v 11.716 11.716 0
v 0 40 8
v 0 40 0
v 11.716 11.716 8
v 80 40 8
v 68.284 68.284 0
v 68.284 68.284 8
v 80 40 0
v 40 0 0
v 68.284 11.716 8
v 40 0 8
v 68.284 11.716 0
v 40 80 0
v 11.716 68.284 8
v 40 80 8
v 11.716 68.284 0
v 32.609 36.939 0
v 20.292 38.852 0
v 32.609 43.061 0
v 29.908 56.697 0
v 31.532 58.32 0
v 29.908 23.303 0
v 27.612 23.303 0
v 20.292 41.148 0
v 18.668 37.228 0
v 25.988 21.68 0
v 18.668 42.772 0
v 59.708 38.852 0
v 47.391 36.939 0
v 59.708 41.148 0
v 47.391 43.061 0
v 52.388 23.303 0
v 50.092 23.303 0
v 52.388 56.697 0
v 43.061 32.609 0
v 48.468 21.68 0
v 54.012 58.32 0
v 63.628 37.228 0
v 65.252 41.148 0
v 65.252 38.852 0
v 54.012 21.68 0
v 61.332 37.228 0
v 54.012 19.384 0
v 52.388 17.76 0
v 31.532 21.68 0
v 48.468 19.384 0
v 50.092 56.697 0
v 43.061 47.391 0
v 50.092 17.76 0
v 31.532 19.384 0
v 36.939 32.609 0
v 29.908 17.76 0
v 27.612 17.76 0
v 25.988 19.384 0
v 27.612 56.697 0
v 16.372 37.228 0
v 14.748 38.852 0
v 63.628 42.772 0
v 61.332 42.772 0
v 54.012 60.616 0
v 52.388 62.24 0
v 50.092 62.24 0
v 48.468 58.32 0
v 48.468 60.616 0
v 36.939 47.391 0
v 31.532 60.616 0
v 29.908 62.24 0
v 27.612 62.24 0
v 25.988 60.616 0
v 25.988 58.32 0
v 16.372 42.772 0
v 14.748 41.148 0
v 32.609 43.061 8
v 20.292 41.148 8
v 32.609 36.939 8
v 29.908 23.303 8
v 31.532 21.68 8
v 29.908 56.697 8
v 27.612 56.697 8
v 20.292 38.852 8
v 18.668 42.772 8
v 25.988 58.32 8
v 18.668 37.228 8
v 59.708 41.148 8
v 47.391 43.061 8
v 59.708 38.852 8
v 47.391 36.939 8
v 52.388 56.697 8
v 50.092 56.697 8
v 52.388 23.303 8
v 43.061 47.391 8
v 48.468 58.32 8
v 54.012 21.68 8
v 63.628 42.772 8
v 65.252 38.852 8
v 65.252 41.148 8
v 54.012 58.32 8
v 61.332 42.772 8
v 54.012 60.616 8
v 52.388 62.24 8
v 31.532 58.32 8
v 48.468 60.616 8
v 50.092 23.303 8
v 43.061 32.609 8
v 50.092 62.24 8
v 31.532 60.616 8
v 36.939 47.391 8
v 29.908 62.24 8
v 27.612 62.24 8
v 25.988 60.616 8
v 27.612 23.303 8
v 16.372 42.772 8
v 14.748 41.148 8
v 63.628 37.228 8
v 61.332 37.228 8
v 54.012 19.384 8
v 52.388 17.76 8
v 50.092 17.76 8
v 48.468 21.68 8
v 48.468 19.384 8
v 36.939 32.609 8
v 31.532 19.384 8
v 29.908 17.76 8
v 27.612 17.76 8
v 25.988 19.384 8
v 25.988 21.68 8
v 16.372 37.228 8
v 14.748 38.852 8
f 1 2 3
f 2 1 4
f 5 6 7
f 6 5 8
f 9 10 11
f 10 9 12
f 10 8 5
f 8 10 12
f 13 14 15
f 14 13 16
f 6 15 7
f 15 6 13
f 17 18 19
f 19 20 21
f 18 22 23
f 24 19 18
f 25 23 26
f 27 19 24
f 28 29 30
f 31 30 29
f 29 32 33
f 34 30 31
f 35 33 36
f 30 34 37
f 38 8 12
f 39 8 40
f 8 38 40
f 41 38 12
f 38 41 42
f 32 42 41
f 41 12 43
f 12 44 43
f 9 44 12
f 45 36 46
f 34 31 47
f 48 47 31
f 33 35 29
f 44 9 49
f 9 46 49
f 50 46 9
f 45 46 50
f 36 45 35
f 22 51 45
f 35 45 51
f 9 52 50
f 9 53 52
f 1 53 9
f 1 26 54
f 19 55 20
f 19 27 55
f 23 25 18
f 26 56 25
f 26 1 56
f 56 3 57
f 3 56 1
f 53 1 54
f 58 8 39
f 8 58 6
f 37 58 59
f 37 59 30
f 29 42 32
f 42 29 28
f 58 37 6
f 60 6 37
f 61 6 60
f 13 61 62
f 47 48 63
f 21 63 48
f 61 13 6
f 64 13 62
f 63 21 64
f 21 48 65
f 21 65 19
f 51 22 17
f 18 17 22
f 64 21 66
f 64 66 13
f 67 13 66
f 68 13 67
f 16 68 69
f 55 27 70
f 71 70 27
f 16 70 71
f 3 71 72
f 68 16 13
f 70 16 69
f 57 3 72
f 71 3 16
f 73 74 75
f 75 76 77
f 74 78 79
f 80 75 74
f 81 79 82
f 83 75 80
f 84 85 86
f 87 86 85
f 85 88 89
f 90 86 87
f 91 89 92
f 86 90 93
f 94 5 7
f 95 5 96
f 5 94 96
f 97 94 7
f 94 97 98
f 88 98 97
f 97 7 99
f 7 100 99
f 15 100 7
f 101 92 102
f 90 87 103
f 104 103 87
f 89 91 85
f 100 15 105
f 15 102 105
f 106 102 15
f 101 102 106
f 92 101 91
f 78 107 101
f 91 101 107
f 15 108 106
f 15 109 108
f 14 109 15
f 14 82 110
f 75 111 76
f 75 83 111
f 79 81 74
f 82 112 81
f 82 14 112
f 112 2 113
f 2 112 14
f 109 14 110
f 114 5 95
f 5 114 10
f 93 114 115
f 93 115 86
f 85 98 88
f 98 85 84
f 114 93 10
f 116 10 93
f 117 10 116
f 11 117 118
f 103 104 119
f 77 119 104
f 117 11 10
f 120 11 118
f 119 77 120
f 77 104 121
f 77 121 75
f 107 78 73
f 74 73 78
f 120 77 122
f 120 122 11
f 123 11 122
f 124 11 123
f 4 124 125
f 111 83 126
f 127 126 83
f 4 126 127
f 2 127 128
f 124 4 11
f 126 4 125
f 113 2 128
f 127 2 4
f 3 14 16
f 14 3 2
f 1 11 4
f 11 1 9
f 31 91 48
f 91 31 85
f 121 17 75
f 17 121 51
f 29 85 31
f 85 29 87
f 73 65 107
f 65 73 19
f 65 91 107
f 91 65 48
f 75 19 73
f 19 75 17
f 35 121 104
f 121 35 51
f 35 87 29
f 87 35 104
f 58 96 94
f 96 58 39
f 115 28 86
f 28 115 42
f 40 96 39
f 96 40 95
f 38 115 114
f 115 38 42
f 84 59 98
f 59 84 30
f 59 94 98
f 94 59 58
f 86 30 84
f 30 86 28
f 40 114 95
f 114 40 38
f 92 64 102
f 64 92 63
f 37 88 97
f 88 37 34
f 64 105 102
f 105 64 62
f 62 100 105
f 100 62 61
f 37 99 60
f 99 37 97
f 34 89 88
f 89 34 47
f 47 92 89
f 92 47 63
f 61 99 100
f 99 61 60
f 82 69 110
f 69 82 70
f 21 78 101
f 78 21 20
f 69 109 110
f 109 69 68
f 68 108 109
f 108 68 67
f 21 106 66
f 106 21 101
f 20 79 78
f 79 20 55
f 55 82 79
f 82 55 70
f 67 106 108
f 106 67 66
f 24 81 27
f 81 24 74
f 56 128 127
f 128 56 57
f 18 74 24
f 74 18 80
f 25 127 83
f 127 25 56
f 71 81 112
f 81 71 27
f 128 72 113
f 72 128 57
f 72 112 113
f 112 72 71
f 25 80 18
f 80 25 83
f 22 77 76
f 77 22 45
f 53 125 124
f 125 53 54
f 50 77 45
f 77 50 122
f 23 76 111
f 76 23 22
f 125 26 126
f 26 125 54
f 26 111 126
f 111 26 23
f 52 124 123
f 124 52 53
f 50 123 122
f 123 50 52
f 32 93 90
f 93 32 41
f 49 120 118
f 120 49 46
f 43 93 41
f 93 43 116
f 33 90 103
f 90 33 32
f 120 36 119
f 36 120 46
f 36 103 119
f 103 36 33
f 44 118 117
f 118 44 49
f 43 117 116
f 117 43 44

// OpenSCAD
$fn = 32;

// ----------------------------------------------------------------------
// Polygon plate: 8-gon R40, 6 bolt windows
// ----------------------------------------------------------------------

// --- parameters (mm) ---
sides = 8;                // number of polygon sides
plate_r = 40;             // circumscribed radius of the polygon
bore_r = 8;               // centre bore radius
bolts = 6;                // number of bolt windows
ring_r = 22.48;           // bolt-circle radius
bolt_r = 3;               // bolt window radius
plate_t = 8;              // plate thickness, Z (extrusion height)
fit_tol = 0.02;           // declared fit tolerance (prompt contract)
free_tol = 0.2;           // declared free tolerance (prompt contract)

plate_d = 2 * plate_r;  // circumscribed diameter
bore_d = 2 * bore_r;  // centre bore diameter
bolt_d = 2 * bolt_r;  // bolt window diameter
ring_d = 2 * ring_r;  // bolt-circle diameter

profile = [[80, 40], [68.284, 68.284], [40, 80], [11.716, 68.284], [0, 40], [11.716, 11.716], [40, 0], [68.284, 11.716]];  // primary outline, 8 points, counter clockwise
void_1 = [[47.391, 43.061], [43.061, 47.391], [36.939, 47.391], [32.609, 43.061], [32.609, 36.939], [36.939, 32.609], [43.061, 32.609], [47.391, 36.939]];  // centre bore, 8 points
void_2 = [[65.252, 41.148], [63.628, 42.772], [61.332, 42.772], [59.708, 41.148], [59.708, 38.852], [61.332, 37.228], [63.628, 37.228], [65.252, 38.852]];  // bolt window 1, 8 points
void_3 = [[54.012, 60.616], [52.388, 62.24], [50.092, 62.24], [48.468, 60.616], [48.468, 58.32], [50.092, 56.697], [52.388, 56.697], [54.012, 58.32]];  // bolt window 2, 8 points
void_4 = [[31.532, 60.616], [29.908, 62.24], [27.612, 62.24], [25.988, 60.616], [25.988, 58.32], [27.612, 56.697], [29.908, 56.697], [31.532, 58.32]];  // bolt window 3, 8 points
void_5 = [[20.292, 41.148], [18.668, 42.772], [16.372, 42.772], [14.748, 41.148], [14.748, 38.852], [16.372, 37.228], [18.668, 37.228], [20.292, 38.852]];  // bolt window 4, 8 points
void_6 = [[31.532, 21.68], [29.908, 23.303], [27.612, 23.303], [25.988, 21.68], [25.988, 19.384], [27.612, 17.76], [29.908, 17.76], [31.532, 19.384]];  // bolt window 5, 8 points
void_7 = [[54.012, 21.68], [52.388, 23.303], [50.092, 23.303], [48.468, 21.68], [48.468, 19.384], [50.092, 17.76], [52.388, 17.76], [54.012, 19.384]];  // bolt window 6, 8 points

// --- the one profile operation ---
difference() {
  linear_extrude(height = plate_t) polygon(points = profile);
  translate([0, 0, -1])
    linear_extrude(height = plate_t + 2) polygon(points = void_1);
  translate([0, 0, -1])
    linear_extrude(height = plate_t + 2) polygon(points = void_2);
  translate([0, 0, -1])
    linear_extrude(height = plate_t + 2) polygon(points = void_3);
  translate([0, 0, -1])
    linear_extrude(height = plate_t + 2) polygon(points = void_4);
  translate([0, 0, -1])
    linear_extrude(height = plate_t + 2) polygon(points = void_5);
  translate([0, 0, -1])
    linear_extrude(height = plate_t + 2) polygon(points = void_6);
  translate([0, 0, -1])
    linear_extrude(height = plate_t + 2) polygon(points = void_7);
}
